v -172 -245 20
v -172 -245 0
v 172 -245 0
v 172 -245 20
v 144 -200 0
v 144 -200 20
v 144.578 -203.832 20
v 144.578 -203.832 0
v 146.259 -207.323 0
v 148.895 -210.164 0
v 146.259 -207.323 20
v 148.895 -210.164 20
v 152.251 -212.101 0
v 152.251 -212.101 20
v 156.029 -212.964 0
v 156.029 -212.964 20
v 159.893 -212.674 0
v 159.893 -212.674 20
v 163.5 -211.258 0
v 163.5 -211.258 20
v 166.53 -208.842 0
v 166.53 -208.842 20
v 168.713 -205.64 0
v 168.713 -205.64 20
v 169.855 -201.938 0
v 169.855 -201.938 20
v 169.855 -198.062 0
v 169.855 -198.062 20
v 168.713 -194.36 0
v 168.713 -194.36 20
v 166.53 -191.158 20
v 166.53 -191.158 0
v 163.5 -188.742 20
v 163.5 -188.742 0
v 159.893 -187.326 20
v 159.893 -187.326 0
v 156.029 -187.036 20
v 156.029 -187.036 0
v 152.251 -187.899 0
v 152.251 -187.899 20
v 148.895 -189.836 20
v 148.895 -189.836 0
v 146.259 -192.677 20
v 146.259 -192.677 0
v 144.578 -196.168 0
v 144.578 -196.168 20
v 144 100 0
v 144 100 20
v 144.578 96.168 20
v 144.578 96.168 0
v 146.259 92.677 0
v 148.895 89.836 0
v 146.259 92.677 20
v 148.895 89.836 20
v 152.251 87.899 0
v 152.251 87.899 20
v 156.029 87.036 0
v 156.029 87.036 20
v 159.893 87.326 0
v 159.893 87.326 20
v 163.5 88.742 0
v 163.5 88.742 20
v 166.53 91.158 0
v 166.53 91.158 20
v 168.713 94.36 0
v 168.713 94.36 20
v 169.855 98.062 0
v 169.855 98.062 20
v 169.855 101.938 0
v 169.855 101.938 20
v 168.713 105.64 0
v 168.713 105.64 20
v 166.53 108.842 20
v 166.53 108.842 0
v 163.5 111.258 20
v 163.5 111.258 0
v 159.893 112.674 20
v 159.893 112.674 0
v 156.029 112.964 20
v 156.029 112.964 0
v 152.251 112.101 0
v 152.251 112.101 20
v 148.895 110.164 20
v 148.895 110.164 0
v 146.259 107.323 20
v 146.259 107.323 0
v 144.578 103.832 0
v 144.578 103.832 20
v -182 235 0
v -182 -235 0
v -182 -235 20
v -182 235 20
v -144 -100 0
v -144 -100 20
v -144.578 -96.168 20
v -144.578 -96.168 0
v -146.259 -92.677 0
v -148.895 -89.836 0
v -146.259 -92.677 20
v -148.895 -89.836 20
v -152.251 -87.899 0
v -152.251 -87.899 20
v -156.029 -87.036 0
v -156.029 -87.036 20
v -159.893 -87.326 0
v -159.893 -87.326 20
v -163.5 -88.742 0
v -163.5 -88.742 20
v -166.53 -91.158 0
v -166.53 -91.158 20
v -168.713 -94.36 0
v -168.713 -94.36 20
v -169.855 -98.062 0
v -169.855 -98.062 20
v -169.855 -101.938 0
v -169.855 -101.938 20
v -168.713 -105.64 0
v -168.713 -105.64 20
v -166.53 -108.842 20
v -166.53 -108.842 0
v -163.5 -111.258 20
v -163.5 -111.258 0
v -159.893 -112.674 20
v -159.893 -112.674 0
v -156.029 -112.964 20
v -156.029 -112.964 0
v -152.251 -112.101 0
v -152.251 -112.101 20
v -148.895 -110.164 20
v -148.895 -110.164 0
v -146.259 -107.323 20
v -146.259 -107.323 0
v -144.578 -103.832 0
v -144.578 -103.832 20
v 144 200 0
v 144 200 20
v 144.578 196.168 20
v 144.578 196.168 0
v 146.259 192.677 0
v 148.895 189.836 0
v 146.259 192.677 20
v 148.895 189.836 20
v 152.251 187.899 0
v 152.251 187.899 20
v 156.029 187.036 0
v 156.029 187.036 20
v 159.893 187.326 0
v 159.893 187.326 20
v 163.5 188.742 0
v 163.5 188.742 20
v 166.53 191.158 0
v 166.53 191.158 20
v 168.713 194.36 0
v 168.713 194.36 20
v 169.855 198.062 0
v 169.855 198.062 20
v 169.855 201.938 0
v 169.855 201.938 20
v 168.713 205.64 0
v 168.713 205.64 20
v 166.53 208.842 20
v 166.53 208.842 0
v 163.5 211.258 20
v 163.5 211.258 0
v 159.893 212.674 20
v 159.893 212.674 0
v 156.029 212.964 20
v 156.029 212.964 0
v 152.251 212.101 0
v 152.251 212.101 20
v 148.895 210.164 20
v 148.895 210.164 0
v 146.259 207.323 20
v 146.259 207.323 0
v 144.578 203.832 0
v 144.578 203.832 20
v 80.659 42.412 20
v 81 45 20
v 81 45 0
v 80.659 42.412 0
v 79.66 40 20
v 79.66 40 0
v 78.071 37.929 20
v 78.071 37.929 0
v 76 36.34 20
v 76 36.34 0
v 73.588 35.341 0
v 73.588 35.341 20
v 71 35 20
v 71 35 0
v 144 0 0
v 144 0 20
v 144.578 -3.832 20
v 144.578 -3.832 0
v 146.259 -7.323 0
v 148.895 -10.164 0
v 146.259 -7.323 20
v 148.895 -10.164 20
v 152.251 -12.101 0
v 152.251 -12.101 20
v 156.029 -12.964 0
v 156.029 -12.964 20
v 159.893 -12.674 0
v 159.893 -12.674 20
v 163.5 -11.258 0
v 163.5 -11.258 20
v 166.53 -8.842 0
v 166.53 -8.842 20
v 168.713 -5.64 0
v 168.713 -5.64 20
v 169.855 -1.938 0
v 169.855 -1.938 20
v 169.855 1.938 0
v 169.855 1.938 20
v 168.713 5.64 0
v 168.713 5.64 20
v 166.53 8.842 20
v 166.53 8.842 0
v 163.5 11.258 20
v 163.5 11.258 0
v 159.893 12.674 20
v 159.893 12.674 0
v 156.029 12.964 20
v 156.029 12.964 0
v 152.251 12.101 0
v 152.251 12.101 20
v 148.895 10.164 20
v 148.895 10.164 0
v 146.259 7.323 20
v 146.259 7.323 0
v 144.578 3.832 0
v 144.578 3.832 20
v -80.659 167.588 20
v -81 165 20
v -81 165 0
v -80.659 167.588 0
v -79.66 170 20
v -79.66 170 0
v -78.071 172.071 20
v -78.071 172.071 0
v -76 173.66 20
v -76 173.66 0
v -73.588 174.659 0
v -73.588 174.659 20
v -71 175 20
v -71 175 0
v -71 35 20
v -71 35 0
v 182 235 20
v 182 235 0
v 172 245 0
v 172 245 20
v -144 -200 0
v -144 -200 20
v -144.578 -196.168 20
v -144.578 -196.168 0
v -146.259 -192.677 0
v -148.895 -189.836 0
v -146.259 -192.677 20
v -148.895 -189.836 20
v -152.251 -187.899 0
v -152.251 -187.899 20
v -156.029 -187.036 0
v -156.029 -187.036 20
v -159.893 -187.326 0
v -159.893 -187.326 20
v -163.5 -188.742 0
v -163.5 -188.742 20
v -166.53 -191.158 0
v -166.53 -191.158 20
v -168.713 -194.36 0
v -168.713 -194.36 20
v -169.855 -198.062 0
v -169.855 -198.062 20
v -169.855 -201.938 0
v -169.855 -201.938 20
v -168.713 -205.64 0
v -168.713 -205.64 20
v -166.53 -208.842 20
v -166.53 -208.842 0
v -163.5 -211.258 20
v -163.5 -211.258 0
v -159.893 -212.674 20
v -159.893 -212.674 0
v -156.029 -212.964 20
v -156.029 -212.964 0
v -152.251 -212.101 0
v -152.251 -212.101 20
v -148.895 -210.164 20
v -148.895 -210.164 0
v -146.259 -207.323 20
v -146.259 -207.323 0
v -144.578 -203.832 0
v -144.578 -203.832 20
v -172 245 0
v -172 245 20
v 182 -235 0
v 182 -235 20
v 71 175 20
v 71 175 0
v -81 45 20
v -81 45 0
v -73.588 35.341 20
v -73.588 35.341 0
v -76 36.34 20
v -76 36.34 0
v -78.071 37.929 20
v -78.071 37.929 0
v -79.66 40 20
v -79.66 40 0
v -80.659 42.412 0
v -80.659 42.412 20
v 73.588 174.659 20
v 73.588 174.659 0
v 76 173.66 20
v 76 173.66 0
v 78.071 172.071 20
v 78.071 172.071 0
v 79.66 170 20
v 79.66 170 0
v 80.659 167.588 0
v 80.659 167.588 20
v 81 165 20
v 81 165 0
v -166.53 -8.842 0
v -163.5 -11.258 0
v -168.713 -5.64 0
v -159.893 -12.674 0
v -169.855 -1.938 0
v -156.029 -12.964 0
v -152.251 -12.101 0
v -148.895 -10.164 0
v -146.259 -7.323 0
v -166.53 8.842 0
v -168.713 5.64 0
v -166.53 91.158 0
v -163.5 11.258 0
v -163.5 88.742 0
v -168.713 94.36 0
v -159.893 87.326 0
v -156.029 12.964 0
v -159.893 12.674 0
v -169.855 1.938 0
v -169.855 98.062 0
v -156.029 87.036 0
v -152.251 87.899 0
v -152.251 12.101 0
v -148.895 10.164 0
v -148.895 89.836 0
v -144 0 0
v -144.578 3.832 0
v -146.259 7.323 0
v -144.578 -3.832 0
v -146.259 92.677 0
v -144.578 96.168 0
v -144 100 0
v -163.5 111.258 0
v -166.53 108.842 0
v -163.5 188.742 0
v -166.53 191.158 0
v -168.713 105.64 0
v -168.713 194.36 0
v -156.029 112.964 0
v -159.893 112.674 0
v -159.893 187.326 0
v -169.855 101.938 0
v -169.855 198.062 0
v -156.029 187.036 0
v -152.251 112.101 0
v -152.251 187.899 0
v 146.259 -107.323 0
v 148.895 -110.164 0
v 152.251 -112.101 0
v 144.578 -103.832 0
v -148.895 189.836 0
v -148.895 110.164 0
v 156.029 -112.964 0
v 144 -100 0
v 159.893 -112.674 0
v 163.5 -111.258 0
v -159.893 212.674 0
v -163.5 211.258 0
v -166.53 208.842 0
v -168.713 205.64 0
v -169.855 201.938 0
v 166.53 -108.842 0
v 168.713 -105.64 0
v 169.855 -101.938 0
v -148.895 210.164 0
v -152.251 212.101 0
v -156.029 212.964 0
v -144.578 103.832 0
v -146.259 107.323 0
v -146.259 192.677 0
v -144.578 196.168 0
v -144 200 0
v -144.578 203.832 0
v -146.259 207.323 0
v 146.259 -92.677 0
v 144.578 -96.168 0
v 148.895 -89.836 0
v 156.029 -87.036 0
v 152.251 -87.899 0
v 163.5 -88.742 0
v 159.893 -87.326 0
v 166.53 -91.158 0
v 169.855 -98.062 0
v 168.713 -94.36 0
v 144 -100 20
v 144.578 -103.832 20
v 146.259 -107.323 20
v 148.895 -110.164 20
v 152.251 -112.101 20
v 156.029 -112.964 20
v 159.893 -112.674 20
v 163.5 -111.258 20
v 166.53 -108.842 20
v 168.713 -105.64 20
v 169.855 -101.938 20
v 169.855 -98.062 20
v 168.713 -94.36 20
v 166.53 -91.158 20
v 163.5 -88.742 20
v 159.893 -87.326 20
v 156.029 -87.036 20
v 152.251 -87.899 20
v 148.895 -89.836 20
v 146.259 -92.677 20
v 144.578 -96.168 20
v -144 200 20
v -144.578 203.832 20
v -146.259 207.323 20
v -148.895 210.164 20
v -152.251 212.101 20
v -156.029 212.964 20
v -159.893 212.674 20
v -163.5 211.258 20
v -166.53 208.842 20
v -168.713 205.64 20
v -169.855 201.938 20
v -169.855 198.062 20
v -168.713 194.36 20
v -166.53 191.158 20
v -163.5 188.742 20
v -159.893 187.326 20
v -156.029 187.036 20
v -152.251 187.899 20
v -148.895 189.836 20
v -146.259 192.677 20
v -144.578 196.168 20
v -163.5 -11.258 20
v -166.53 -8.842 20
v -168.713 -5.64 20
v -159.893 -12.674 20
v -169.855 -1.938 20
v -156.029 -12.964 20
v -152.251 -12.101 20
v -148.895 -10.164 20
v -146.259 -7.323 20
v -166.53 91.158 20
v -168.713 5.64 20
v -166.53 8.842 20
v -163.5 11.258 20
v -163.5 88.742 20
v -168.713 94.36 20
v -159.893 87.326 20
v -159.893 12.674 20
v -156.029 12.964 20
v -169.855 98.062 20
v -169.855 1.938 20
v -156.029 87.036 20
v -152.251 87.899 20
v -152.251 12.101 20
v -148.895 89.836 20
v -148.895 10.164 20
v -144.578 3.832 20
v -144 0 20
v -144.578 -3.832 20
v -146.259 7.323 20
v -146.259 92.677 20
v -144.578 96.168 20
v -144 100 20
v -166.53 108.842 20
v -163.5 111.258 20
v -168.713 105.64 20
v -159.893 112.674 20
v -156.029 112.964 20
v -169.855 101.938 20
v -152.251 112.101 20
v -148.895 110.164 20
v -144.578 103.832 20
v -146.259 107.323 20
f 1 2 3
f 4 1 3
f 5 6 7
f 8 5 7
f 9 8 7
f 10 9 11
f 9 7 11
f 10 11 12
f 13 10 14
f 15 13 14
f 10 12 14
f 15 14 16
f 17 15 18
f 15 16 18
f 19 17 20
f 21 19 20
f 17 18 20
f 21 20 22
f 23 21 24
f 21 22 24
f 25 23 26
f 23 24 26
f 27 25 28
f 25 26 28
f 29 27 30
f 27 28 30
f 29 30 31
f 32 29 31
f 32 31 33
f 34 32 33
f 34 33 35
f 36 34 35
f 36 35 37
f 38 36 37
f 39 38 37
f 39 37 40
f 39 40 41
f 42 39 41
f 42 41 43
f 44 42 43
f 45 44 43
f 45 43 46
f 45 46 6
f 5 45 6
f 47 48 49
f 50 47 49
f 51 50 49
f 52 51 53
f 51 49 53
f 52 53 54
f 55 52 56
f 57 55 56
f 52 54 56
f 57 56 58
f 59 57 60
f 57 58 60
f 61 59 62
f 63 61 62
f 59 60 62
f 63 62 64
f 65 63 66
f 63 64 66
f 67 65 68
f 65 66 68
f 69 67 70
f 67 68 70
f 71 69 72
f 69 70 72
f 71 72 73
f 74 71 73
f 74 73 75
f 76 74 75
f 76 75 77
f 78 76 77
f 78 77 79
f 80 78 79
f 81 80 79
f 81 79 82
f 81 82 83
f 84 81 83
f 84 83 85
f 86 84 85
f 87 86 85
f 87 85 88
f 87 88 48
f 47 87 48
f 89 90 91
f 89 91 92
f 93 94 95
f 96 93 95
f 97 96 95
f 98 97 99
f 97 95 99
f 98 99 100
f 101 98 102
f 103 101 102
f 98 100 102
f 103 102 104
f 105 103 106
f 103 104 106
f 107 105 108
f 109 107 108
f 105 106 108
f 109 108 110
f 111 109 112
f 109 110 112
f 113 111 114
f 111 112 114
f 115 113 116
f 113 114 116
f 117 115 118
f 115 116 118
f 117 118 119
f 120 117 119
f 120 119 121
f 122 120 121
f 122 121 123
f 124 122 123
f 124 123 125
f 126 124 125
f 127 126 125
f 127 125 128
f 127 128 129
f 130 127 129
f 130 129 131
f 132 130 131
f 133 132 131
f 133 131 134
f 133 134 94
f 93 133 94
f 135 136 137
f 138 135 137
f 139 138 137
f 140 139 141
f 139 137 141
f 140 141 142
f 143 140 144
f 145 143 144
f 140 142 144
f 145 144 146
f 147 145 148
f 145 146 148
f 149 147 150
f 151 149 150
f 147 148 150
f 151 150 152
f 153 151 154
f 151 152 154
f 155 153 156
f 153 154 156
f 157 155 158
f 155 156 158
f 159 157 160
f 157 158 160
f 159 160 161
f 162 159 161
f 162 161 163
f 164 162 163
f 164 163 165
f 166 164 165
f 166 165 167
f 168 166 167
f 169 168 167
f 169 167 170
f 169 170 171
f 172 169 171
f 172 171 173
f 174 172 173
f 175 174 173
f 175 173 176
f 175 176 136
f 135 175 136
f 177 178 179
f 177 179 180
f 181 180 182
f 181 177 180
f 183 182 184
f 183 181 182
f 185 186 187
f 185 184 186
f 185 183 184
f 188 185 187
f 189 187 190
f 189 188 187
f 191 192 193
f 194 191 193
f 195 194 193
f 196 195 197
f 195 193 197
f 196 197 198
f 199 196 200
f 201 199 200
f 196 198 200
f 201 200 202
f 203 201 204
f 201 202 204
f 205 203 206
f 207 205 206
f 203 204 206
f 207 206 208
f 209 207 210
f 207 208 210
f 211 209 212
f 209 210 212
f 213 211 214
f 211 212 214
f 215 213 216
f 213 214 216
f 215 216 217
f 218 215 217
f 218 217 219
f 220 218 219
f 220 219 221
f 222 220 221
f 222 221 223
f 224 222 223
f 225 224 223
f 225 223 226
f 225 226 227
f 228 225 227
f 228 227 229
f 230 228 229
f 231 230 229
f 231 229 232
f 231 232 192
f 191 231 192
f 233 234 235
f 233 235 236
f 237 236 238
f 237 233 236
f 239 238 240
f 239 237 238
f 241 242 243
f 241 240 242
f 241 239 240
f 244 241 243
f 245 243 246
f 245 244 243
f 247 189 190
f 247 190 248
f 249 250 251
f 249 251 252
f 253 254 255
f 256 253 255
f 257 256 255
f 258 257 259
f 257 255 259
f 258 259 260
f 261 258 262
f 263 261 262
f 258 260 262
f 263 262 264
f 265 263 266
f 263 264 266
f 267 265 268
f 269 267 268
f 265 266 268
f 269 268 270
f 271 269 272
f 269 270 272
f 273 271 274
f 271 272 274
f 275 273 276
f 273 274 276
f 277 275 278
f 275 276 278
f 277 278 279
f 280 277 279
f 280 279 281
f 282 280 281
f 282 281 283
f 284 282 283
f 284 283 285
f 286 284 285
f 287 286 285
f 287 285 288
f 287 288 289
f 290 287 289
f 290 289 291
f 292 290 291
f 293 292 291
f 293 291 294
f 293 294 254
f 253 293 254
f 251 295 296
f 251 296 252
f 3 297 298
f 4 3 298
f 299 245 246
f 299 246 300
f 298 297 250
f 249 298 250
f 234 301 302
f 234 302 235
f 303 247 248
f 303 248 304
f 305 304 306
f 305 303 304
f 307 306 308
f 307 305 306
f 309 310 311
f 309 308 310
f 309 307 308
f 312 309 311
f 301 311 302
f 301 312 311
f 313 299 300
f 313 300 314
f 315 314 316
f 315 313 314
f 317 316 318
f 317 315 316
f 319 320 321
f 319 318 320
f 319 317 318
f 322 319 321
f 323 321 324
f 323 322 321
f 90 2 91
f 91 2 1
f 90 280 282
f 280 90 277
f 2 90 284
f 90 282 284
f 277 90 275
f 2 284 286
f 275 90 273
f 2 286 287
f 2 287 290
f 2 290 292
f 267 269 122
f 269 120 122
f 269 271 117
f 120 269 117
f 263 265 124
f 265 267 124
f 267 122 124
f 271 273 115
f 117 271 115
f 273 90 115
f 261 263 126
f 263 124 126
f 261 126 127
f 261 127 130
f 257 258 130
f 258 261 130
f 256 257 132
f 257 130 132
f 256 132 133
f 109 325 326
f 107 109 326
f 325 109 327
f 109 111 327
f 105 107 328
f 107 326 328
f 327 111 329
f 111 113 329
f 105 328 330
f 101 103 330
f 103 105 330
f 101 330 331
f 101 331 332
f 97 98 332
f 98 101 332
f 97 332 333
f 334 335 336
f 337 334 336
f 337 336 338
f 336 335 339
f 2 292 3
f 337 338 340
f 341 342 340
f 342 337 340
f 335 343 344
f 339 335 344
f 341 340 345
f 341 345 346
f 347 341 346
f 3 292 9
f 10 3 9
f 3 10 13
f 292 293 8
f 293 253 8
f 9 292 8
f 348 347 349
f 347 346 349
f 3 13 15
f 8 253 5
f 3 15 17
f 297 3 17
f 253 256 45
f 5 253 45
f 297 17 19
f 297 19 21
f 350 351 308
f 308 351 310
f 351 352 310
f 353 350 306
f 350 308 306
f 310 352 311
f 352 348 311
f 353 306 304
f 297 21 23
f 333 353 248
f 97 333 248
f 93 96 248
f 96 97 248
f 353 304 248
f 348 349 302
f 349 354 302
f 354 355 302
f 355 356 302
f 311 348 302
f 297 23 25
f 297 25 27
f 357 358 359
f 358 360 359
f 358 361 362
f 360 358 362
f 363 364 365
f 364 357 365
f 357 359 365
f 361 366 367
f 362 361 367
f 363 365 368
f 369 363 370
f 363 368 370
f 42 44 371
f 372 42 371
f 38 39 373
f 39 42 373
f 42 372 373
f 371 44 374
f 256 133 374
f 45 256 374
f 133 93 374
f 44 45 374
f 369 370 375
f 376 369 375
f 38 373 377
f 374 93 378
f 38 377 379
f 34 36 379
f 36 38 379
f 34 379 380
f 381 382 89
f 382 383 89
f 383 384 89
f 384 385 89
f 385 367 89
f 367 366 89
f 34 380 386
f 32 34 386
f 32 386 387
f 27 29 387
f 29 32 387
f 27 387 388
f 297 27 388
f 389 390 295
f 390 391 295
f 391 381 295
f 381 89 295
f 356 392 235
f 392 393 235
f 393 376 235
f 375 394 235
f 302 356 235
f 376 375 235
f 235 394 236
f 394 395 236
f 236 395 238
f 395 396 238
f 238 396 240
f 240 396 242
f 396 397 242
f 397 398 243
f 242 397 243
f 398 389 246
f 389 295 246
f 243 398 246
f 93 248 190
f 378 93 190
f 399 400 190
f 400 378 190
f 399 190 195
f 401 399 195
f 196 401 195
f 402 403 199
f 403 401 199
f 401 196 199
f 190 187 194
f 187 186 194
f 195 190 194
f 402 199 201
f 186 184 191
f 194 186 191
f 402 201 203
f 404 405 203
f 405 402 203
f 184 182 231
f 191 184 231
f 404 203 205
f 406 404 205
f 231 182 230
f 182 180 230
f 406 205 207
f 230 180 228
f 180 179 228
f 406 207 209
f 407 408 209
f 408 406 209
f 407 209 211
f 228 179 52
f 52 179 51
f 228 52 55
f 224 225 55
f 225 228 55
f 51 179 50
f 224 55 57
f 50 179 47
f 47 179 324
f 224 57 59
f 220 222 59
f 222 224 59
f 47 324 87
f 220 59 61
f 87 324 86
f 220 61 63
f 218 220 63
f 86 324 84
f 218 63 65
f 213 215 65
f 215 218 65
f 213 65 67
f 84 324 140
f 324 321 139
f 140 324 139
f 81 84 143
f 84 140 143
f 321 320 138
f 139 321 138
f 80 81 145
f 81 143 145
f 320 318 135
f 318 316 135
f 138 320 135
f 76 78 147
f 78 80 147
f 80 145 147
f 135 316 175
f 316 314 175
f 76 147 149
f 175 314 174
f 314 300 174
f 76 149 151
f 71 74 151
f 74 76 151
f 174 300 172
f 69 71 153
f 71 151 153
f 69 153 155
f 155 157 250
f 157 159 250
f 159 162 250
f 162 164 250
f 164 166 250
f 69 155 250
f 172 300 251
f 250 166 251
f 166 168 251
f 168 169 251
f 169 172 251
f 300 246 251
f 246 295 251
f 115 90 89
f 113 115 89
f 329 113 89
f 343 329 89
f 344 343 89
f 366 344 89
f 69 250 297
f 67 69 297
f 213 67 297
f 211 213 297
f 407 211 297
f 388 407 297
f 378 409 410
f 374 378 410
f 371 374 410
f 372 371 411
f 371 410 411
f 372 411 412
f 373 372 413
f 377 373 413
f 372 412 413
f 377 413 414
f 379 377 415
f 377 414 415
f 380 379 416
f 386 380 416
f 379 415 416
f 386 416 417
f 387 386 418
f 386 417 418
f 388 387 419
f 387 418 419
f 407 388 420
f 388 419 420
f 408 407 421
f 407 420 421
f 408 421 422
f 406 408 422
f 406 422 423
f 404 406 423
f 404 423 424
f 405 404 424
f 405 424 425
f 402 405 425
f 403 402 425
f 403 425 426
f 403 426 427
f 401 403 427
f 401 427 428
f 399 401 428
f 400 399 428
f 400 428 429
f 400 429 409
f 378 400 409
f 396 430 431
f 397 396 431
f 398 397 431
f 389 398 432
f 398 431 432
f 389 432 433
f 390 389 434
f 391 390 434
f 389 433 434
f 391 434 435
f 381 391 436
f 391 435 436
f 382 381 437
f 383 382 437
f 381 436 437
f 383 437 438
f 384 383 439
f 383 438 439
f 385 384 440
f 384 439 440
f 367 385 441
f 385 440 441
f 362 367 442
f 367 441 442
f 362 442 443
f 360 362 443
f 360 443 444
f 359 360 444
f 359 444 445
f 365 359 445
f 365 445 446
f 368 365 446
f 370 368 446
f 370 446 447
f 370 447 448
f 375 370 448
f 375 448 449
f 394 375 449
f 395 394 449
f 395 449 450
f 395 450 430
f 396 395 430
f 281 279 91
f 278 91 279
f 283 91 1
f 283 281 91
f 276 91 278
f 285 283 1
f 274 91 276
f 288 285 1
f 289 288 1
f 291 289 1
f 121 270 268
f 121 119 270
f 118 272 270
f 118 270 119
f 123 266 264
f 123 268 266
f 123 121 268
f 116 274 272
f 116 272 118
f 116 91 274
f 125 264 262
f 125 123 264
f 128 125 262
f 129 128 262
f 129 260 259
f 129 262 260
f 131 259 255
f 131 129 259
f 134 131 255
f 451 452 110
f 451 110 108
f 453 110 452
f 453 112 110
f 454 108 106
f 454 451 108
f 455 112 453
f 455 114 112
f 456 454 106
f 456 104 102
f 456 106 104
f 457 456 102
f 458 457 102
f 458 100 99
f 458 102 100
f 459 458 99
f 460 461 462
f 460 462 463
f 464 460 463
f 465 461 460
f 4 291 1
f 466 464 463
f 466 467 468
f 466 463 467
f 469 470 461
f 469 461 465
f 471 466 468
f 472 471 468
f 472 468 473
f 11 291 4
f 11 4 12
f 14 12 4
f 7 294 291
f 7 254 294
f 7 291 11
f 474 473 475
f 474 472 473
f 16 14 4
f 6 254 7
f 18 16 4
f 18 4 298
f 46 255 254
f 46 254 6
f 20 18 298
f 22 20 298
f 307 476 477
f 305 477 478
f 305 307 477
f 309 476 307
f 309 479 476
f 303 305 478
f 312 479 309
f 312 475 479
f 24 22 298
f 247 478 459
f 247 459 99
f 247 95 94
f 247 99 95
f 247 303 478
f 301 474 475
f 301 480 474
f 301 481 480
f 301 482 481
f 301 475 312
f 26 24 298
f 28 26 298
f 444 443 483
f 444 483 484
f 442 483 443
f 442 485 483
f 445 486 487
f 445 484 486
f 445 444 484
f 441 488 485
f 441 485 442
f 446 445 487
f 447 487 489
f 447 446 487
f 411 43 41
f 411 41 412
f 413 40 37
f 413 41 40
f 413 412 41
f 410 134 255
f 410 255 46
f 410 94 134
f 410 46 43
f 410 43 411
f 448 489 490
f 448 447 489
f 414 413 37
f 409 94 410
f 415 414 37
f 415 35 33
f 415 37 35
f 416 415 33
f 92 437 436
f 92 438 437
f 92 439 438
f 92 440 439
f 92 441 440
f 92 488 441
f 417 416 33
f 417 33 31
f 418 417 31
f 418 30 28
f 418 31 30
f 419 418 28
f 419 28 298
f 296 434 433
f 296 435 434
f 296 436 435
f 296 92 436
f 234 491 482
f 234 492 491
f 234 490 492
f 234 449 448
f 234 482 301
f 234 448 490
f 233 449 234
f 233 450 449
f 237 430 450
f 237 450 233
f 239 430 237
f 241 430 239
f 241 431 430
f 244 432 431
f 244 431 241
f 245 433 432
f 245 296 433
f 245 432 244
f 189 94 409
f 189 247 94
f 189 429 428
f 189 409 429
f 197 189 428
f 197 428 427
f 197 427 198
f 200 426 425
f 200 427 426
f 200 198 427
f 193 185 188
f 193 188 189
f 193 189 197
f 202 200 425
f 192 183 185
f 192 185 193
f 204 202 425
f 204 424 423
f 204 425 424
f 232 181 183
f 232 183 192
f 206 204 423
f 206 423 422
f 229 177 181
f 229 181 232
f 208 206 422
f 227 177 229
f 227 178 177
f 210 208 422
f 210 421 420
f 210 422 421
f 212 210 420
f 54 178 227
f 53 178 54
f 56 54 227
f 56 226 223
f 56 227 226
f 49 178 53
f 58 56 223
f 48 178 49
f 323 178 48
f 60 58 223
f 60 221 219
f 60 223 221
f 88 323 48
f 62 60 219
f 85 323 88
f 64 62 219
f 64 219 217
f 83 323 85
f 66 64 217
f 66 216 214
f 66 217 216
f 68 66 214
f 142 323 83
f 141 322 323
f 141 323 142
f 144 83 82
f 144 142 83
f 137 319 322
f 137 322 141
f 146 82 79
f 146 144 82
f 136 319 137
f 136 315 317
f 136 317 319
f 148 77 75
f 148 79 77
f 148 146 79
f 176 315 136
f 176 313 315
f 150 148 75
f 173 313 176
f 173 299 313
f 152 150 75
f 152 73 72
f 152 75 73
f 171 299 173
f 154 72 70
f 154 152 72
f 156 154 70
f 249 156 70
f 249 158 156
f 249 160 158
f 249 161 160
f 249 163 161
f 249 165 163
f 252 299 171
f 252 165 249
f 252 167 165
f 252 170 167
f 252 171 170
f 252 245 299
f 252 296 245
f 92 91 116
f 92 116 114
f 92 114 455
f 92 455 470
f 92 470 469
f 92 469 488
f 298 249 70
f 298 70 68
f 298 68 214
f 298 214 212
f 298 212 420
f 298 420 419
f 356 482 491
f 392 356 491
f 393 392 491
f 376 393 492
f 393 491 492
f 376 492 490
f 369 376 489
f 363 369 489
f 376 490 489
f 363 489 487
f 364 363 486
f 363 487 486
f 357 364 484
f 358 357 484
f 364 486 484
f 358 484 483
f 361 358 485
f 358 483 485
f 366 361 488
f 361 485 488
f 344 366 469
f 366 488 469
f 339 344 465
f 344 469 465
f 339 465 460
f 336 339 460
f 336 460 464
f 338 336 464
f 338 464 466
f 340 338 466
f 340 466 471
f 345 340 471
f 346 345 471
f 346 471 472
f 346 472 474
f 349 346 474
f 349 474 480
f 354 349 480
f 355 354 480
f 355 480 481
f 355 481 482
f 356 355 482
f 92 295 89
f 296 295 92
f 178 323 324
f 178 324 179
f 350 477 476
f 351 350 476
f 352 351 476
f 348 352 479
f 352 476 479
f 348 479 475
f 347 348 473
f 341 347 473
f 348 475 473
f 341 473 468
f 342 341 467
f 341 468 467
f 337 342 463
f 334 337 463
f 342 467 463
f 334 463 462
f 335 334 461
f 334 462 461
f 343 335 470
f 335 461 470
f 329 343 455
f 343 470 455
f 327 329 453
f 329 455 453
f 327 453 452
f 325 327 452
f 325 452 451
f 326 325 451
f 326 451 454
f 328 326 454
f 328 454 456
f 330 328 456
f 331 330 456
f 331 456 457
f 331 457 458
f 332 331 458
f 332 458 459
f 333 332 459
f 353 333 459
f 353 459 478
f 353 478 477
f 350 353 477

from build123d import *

# Parameters (mm, degrees)
SKETCH_1_W          = 364
SKETCH_1_H          = 490
EXTRUDE_1_DEPTH     = 20
SKETCH_2_R          = 13
CUT_EXTRUDE_1_DEPTH = 306.857810101
CHAMFER_1_SIZE      = 10


with BuildPart() as part:
    # 草图1 → 凸台-拉伸1 (new body)
    with BuildSketch(Plane.XY):
        Rectangle(SKETCH_1_W, SKETCH_1_H)
    extrude(amount=EXTRUDE_1_DEPTH)

    # 草图2 → 切除-拉伸1 (cut, through all)
    with BuildSketch(Plane.XY.offset(20)):
        with Locations((-157, 200)):
            Circle(SKETCH_2_R)
        with Locations((-157, 100)):
            Circle(SKETCH_2_R)
        with Locations((-157, 0)):
            Circle(SKETCH_2_R)
        with Locations((-157, -100)):
            Circle(SKETCH_2_R)
        with Locations((-157, -200)):
            Circle(SKETCH_2_R)
        with Locations(Location((157, -200, 0), (0, 0, 180))):
            Circle(SKETCH_2_R)
        with Locations(Location((157, -100, 0), (0, 0, 180))):
            Circle(SKETCH_2_R)
        with Locations(Location((157, 0, 0), (0, 0, 180))):
            Circle(SKETCH_2_R)
        with Locations(Location((157, 100, 0), (0, 0, 180))):
            Circle(SKETCH_2_R)
        with Locations(Location((157, 200, 0), (0, 0, 180))):
            Circle(SKETCH_2_R)
        with BuildLine():
            Line((-71, 175), (71, 175))
            ThreePointArc((71, 175), (78.071067812, 172.071067812), (81, 165))
            Line((81, 165), (81, 45))
            ThreePointArc((81, 45), (78.071067812, 37.928932188), (71, 35))
            Line((71, 35), (-71, 35))
            ThreePointArc((-71, 35), (-78.071067812, 37.928932188), (-81, 45))
            Line((-81, 45), (-81, 165))
            ThreePointArc((-81, 165), (-78.071067812, 172.071067812), (-71, 175))
        make_face()
    extrude(amount=-CUT_EXTRUDE_1_DEPTH, mode=Mode.SUBTRACT)

    # 倒角1
    chamfer_1_edges = [part.edges().sort_by_distance(p)[0] for p in [
        (182, -245, 10),
        (-182, -245, 10),
        (-182, 245, 10),
        (182, 245, 10),
    ]]
    chamfer(chamfer_1_edges, length=CHAMFER_1_SIZE)


solid = part.part
